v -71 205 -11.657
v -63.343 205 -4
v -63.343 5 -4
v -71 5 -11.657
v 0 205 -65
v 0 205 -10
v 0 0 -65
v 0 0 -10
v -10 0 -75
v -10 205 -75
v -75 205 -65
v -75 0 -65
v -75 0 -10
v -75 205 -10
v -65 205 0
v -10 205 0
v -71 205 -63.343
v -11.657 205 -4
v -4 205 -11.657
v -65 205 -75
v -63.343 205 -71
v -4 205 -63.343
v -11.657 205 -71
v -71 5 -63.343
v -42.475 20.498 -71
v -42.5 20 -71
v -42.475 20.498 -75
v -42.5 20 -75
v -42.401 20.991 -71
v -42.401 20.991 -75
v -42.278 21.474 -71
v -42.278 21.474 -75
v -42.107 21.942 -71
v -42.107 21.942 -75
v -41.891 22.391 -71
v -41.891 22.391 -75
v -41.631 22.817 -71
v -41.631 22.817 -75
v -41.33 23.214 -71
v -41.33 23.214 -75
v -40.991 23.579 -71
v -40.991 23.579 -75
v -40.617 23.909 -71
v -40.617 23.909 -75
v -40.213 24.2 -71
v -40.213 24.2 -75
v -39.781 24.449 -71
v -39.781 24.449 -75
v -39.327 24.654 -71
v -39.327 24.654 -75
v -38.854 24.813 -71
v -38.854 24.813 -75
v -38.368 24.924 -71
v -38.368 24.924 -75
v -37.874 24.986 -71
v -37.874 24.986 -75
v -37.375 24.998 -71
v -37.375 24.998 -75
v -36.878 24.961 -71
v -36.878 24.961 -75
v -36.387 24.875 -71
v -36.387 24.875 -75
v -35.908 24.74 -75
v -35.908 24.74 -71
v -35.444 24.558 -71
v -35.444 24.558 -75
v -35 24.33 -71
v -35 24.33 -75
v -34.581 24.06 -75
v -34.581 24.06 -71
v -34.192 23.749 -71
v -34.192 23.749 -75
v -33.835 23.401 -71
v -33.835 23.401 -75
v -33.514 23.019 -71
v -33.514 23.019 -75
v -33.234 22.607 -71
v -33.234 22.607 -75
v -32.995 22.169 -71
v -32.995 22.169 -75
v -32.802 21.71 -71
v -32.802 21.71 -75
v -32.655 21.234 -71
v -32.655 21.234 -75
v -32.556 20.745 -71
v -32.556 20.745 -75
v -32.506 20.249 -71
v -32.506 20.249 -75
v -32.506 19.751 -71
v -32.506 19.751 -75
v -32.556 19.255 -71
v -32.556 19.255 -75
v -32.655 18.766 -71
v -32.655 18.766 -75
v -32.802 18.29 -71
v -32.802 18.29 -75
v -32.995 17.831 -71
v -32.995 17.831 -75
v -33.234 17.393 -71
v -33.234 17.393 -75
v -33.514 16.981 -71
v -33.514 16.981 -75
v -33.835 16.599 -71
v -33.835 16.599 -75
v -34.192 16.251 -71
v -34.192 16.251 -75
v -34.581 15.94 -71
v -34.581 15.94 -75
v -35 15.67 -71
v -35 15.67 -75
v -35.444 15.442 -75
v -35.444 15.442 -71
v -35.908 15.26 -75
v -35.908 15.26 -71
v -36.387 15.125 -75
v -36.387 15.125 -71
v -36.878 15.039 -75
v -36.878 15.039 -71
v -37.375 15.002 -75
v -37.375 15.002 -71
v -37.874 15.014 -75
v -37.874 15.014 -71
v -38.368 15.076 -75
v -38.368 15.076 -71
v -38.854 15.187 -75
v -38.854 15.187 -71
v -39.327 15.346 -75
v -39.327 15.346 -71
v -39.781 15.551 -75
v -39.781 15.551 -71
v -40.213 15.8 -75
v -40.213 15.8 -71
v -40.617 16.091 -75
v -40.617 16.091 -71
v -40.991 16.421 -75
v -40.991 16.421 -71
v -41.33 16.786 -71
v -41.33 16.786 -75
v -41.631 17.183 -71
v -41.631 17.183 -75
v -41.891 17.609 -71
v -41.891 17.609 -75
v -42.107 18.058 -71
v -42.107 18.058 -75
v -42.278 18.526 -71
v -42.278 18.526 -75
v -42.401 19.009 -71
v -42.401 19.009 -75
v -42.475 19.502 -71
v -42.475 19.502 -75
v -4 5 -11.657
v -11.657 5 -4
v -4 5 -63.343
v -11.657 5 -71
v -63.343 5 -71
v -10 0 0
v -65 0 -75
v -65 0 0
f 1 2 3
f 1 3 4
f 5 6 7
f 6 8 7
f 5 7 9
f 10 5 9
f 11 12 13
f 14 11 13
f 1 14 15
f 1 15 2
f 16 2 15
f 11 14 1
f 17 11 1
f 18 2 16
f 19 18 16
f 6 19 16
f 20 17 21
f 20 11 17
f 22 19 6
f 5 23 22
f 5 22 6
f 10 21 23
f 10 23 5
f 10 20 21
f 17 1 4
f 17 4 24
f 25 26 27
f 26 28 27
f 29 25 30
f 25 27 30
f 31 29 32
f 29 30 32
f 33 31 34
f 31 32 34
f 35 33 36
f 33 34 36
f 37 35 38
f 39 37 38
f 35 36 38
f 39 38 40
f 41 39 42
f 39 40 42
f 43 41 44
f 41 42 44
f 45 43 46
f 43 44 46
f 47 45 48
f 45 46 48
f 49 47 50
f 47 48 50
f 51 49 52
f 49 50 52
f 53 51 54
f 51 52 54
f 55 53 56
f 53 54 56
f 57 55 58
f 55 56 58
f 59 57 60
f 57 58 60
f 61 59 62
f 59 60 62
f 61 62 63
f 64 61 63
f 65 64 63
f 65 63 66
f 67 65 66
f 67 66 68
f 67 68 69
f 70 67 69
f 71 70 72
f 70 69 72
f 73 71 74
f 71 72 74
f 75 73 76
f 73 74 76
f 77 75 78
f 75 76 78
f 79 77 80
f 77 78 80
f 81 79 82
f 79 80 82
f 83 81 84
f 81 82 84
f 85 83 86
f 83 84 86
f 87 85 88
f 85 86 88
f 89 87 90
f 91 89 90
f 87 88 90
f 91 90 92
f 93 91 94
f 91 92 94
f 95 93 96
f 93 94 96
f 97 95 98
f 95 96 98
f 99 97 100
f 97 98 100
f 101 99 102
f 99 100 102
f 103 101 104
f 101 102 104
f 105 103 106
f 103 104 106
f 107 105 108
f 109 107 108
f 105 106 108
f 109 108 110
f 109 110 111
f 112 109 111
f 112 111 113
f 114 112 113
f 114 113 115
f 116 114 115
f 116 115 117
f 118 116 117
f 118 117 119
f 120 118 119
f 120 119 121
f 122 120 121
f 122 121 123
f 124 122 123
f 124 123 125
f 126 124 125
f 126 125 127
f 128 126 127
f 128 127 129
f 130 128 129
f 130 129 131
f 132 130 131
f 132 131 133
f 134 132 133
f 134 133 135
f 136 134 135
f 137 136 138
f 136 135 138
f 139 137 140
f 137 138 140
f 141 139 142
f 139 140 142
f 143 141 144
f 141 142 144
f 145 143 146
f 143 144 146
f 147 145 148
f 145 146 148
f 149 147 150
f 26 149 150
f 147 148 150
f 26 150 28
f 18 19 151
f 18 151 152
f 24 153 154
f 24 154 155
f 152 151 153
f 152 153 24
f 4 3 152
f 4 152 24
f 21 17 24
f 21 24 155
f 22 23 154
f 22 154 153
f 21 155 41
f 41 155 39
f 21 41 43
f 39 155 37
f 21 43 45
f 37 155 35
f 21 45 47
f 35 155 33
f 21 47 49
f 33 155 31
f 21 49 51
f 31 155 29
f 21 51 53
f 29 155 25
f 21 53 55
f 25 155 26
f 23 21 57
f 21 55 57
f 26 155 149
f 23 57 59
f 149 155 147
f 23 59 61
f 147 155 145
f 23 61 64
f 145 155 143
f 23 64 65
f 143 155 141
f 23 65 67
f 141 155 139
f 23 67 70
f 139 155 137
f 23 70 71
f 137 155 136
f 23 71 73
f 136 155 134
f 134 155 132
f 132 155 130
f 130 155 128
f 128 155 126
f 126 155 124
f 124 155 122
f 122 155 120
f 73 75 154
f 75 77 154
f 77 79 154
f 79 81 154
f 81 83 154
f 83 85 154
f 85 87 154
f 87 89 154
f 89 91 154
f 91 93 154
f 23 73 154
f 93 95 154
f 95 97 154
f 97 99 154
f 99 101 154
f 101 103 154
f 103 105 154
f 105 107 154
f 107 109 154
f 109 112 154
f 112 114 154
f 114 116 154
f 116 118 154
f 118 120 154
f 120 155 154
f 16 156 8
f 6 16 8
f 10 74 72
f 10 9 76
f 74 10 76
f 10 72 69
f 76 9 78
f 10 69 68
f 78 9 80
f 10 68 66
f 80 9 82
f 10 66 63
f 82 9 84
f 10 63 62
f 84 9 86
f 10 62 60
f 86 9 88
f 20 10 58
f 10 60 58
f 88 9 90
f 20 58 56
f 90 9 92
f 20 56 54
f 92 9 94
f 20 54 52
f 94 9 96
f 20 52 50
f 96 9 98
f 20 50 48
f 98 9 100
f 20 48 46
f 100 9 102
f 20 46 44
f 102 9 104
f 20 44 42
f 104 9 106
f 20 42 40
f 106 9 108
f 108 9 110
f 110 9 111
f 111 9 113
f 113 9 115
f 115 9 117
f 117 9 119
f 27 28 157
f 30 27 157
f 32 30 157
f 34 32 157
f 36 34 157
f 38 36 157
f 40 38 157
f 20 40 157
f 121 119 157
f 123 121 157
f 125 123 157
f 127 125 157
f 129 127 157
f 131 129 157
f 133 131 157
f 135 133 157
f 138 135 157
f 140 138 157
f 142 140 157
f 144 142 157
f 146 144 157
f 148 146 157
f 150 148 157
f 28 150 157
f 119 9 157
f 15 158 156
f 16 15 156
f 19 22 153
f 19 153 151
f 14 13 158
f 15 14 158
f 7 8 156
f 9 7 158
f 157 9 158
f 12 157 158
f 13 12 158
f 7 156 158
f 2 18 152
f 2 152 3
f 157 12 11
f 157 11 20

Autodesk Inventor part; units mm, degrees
ref_plane "YZ Plane" through (0, 0, 0) normal (1, 0, 0) x (0, 1, 0)
ref_plane "XZ Plane" through (0, 0, 0) normal (0, 1, 0) x (-1, 0, 0)
ref_plane "XY Plane" through (0, 0, 0) normal (0, 0, 1) x (1, 0, 0)
sketch "Sketch1" plane through (0, 0, 0) normal (0, 1, 0) x (-1, 0, 0)
  line L0 (65, 0) -> (10, 0)
  line L1 (0, -10) -> (0, -65)
  line L2 (10, -75) -> (65, -75)
  line L3 (75, -65) -> (75, -10)
  line L4 (75, -10) -> (65, 0)
  line L5 (10, 0) -> (0, -10)
  line L6 (0, -65) -> (10, -75)
  line L7 (75, -65) -> (65, -75)
  point P0 (0, 0)
  point P1 (75, 0)
  point P2 (0, -75)
  point P3 (0, 0)
  point P4 (75, -75)
  dimension "d0" = 75
  dimension "d1" = 75
  dimension "d2" = 10
  dimension "d3" = 10
  dimension "d4" = 10
  dimension "d5" = 10
  dimension "d6" = 10
  dimension "d7" = 10
  dimension "d8" = 10
  dimension "d9" = 10
extrude "Extrusion1" add sketch "Sketch1" along normal blind 5
sketch "Sketch2" plane through (0, 5, 0) normal (0, 1, 0) x (1, 0, 0)
  line L0 (-75, 10) -> (-65, 0) projected
  line L1 (-75, 65) -> (-75, 10) projected
  line L2 (-75, 10) -> (-75, 65)
  line L3 (-65, 75) -> (-75, 65) projected
  line L4 (-75, 65) -> (-65, 75)
  line L5 (-75, 10) -> (-65, 0)
  line L6 (-65, 0) -> (-10, 0) projected
  line L7 (-10, 0) -> (0, 10) projected
  line L8 (-10, 0) -> (0, 10)
  line L9 (0, 10) -> (0, 65) projected
  line L10 (0, 10) -> (0, 65)
  line L11 (0, 65) -> (-10, 75)
  line L12 (-10, 75) -> (-65, 75) projected
  line L13 (-10, 75) -> (-65, 75)
  line L14 (-65, 0) -> (-10, 0)
  line L15 (-11.6569, 71) -> (-4, 63.3431)
  line L16 (-4, 63.3431) -> (-4, 11.6569)
  line L17 (-4, 11.6569) -> (-11.6569, 4)
  line L18 (-11.6569, 4) -> (-63.3431, 4)
  line L19 (-63.3431, 4) -> (-71, 11.6569)
  line L20 (-71, 11.6569) -> (-71, 63.3431)
  line L21 (-71, 63.3431) -> (-63.3431, 71)
  line L22 (-63.3431, 71) -> (-11.6569, 71)
  point P0 (0, 0)
  dimension "d12" = 4
extrude "Extrusion2" add sketch "Sketch2" along normal blind 200
sketch "Sketch3" plane through (-10, 0, -75) normal (0, 0, -1) x (-1, 0, 0)
  circle A0 centre (27.5, 20) radius 5
  line L0 (0, 0) -> (0, 205) construction
  line L1 (55, 0) -> (0, 0) construction
  line L2 (0, 0) -> (55, 0) construction
  point P0 (-10, 0)
  point P1 (27.5, 0)
  dimension "d15" = 10
  dimension "d16" = 20
  dimension "d17" = 55
  dimension "d18" = 27.5
extrude "Extrusion3" cut sketch "Sketch3" against normal blind 4
sketch "Sketch4" plane through (0, 205, 0) normal (0, 1, 0) x (1, 0, 0)
  point P0 (0, 0)
equation "\"d3\" = d2"
equation "\"d4\" = d2"
equation "\"d5\" = d4"
equation "\"d6\" = d2"
equation "\"d7\" = d6"
equation "\"d8\" = d2"
equation "\"d9\" = d8"
properties part number "laser_leg"
